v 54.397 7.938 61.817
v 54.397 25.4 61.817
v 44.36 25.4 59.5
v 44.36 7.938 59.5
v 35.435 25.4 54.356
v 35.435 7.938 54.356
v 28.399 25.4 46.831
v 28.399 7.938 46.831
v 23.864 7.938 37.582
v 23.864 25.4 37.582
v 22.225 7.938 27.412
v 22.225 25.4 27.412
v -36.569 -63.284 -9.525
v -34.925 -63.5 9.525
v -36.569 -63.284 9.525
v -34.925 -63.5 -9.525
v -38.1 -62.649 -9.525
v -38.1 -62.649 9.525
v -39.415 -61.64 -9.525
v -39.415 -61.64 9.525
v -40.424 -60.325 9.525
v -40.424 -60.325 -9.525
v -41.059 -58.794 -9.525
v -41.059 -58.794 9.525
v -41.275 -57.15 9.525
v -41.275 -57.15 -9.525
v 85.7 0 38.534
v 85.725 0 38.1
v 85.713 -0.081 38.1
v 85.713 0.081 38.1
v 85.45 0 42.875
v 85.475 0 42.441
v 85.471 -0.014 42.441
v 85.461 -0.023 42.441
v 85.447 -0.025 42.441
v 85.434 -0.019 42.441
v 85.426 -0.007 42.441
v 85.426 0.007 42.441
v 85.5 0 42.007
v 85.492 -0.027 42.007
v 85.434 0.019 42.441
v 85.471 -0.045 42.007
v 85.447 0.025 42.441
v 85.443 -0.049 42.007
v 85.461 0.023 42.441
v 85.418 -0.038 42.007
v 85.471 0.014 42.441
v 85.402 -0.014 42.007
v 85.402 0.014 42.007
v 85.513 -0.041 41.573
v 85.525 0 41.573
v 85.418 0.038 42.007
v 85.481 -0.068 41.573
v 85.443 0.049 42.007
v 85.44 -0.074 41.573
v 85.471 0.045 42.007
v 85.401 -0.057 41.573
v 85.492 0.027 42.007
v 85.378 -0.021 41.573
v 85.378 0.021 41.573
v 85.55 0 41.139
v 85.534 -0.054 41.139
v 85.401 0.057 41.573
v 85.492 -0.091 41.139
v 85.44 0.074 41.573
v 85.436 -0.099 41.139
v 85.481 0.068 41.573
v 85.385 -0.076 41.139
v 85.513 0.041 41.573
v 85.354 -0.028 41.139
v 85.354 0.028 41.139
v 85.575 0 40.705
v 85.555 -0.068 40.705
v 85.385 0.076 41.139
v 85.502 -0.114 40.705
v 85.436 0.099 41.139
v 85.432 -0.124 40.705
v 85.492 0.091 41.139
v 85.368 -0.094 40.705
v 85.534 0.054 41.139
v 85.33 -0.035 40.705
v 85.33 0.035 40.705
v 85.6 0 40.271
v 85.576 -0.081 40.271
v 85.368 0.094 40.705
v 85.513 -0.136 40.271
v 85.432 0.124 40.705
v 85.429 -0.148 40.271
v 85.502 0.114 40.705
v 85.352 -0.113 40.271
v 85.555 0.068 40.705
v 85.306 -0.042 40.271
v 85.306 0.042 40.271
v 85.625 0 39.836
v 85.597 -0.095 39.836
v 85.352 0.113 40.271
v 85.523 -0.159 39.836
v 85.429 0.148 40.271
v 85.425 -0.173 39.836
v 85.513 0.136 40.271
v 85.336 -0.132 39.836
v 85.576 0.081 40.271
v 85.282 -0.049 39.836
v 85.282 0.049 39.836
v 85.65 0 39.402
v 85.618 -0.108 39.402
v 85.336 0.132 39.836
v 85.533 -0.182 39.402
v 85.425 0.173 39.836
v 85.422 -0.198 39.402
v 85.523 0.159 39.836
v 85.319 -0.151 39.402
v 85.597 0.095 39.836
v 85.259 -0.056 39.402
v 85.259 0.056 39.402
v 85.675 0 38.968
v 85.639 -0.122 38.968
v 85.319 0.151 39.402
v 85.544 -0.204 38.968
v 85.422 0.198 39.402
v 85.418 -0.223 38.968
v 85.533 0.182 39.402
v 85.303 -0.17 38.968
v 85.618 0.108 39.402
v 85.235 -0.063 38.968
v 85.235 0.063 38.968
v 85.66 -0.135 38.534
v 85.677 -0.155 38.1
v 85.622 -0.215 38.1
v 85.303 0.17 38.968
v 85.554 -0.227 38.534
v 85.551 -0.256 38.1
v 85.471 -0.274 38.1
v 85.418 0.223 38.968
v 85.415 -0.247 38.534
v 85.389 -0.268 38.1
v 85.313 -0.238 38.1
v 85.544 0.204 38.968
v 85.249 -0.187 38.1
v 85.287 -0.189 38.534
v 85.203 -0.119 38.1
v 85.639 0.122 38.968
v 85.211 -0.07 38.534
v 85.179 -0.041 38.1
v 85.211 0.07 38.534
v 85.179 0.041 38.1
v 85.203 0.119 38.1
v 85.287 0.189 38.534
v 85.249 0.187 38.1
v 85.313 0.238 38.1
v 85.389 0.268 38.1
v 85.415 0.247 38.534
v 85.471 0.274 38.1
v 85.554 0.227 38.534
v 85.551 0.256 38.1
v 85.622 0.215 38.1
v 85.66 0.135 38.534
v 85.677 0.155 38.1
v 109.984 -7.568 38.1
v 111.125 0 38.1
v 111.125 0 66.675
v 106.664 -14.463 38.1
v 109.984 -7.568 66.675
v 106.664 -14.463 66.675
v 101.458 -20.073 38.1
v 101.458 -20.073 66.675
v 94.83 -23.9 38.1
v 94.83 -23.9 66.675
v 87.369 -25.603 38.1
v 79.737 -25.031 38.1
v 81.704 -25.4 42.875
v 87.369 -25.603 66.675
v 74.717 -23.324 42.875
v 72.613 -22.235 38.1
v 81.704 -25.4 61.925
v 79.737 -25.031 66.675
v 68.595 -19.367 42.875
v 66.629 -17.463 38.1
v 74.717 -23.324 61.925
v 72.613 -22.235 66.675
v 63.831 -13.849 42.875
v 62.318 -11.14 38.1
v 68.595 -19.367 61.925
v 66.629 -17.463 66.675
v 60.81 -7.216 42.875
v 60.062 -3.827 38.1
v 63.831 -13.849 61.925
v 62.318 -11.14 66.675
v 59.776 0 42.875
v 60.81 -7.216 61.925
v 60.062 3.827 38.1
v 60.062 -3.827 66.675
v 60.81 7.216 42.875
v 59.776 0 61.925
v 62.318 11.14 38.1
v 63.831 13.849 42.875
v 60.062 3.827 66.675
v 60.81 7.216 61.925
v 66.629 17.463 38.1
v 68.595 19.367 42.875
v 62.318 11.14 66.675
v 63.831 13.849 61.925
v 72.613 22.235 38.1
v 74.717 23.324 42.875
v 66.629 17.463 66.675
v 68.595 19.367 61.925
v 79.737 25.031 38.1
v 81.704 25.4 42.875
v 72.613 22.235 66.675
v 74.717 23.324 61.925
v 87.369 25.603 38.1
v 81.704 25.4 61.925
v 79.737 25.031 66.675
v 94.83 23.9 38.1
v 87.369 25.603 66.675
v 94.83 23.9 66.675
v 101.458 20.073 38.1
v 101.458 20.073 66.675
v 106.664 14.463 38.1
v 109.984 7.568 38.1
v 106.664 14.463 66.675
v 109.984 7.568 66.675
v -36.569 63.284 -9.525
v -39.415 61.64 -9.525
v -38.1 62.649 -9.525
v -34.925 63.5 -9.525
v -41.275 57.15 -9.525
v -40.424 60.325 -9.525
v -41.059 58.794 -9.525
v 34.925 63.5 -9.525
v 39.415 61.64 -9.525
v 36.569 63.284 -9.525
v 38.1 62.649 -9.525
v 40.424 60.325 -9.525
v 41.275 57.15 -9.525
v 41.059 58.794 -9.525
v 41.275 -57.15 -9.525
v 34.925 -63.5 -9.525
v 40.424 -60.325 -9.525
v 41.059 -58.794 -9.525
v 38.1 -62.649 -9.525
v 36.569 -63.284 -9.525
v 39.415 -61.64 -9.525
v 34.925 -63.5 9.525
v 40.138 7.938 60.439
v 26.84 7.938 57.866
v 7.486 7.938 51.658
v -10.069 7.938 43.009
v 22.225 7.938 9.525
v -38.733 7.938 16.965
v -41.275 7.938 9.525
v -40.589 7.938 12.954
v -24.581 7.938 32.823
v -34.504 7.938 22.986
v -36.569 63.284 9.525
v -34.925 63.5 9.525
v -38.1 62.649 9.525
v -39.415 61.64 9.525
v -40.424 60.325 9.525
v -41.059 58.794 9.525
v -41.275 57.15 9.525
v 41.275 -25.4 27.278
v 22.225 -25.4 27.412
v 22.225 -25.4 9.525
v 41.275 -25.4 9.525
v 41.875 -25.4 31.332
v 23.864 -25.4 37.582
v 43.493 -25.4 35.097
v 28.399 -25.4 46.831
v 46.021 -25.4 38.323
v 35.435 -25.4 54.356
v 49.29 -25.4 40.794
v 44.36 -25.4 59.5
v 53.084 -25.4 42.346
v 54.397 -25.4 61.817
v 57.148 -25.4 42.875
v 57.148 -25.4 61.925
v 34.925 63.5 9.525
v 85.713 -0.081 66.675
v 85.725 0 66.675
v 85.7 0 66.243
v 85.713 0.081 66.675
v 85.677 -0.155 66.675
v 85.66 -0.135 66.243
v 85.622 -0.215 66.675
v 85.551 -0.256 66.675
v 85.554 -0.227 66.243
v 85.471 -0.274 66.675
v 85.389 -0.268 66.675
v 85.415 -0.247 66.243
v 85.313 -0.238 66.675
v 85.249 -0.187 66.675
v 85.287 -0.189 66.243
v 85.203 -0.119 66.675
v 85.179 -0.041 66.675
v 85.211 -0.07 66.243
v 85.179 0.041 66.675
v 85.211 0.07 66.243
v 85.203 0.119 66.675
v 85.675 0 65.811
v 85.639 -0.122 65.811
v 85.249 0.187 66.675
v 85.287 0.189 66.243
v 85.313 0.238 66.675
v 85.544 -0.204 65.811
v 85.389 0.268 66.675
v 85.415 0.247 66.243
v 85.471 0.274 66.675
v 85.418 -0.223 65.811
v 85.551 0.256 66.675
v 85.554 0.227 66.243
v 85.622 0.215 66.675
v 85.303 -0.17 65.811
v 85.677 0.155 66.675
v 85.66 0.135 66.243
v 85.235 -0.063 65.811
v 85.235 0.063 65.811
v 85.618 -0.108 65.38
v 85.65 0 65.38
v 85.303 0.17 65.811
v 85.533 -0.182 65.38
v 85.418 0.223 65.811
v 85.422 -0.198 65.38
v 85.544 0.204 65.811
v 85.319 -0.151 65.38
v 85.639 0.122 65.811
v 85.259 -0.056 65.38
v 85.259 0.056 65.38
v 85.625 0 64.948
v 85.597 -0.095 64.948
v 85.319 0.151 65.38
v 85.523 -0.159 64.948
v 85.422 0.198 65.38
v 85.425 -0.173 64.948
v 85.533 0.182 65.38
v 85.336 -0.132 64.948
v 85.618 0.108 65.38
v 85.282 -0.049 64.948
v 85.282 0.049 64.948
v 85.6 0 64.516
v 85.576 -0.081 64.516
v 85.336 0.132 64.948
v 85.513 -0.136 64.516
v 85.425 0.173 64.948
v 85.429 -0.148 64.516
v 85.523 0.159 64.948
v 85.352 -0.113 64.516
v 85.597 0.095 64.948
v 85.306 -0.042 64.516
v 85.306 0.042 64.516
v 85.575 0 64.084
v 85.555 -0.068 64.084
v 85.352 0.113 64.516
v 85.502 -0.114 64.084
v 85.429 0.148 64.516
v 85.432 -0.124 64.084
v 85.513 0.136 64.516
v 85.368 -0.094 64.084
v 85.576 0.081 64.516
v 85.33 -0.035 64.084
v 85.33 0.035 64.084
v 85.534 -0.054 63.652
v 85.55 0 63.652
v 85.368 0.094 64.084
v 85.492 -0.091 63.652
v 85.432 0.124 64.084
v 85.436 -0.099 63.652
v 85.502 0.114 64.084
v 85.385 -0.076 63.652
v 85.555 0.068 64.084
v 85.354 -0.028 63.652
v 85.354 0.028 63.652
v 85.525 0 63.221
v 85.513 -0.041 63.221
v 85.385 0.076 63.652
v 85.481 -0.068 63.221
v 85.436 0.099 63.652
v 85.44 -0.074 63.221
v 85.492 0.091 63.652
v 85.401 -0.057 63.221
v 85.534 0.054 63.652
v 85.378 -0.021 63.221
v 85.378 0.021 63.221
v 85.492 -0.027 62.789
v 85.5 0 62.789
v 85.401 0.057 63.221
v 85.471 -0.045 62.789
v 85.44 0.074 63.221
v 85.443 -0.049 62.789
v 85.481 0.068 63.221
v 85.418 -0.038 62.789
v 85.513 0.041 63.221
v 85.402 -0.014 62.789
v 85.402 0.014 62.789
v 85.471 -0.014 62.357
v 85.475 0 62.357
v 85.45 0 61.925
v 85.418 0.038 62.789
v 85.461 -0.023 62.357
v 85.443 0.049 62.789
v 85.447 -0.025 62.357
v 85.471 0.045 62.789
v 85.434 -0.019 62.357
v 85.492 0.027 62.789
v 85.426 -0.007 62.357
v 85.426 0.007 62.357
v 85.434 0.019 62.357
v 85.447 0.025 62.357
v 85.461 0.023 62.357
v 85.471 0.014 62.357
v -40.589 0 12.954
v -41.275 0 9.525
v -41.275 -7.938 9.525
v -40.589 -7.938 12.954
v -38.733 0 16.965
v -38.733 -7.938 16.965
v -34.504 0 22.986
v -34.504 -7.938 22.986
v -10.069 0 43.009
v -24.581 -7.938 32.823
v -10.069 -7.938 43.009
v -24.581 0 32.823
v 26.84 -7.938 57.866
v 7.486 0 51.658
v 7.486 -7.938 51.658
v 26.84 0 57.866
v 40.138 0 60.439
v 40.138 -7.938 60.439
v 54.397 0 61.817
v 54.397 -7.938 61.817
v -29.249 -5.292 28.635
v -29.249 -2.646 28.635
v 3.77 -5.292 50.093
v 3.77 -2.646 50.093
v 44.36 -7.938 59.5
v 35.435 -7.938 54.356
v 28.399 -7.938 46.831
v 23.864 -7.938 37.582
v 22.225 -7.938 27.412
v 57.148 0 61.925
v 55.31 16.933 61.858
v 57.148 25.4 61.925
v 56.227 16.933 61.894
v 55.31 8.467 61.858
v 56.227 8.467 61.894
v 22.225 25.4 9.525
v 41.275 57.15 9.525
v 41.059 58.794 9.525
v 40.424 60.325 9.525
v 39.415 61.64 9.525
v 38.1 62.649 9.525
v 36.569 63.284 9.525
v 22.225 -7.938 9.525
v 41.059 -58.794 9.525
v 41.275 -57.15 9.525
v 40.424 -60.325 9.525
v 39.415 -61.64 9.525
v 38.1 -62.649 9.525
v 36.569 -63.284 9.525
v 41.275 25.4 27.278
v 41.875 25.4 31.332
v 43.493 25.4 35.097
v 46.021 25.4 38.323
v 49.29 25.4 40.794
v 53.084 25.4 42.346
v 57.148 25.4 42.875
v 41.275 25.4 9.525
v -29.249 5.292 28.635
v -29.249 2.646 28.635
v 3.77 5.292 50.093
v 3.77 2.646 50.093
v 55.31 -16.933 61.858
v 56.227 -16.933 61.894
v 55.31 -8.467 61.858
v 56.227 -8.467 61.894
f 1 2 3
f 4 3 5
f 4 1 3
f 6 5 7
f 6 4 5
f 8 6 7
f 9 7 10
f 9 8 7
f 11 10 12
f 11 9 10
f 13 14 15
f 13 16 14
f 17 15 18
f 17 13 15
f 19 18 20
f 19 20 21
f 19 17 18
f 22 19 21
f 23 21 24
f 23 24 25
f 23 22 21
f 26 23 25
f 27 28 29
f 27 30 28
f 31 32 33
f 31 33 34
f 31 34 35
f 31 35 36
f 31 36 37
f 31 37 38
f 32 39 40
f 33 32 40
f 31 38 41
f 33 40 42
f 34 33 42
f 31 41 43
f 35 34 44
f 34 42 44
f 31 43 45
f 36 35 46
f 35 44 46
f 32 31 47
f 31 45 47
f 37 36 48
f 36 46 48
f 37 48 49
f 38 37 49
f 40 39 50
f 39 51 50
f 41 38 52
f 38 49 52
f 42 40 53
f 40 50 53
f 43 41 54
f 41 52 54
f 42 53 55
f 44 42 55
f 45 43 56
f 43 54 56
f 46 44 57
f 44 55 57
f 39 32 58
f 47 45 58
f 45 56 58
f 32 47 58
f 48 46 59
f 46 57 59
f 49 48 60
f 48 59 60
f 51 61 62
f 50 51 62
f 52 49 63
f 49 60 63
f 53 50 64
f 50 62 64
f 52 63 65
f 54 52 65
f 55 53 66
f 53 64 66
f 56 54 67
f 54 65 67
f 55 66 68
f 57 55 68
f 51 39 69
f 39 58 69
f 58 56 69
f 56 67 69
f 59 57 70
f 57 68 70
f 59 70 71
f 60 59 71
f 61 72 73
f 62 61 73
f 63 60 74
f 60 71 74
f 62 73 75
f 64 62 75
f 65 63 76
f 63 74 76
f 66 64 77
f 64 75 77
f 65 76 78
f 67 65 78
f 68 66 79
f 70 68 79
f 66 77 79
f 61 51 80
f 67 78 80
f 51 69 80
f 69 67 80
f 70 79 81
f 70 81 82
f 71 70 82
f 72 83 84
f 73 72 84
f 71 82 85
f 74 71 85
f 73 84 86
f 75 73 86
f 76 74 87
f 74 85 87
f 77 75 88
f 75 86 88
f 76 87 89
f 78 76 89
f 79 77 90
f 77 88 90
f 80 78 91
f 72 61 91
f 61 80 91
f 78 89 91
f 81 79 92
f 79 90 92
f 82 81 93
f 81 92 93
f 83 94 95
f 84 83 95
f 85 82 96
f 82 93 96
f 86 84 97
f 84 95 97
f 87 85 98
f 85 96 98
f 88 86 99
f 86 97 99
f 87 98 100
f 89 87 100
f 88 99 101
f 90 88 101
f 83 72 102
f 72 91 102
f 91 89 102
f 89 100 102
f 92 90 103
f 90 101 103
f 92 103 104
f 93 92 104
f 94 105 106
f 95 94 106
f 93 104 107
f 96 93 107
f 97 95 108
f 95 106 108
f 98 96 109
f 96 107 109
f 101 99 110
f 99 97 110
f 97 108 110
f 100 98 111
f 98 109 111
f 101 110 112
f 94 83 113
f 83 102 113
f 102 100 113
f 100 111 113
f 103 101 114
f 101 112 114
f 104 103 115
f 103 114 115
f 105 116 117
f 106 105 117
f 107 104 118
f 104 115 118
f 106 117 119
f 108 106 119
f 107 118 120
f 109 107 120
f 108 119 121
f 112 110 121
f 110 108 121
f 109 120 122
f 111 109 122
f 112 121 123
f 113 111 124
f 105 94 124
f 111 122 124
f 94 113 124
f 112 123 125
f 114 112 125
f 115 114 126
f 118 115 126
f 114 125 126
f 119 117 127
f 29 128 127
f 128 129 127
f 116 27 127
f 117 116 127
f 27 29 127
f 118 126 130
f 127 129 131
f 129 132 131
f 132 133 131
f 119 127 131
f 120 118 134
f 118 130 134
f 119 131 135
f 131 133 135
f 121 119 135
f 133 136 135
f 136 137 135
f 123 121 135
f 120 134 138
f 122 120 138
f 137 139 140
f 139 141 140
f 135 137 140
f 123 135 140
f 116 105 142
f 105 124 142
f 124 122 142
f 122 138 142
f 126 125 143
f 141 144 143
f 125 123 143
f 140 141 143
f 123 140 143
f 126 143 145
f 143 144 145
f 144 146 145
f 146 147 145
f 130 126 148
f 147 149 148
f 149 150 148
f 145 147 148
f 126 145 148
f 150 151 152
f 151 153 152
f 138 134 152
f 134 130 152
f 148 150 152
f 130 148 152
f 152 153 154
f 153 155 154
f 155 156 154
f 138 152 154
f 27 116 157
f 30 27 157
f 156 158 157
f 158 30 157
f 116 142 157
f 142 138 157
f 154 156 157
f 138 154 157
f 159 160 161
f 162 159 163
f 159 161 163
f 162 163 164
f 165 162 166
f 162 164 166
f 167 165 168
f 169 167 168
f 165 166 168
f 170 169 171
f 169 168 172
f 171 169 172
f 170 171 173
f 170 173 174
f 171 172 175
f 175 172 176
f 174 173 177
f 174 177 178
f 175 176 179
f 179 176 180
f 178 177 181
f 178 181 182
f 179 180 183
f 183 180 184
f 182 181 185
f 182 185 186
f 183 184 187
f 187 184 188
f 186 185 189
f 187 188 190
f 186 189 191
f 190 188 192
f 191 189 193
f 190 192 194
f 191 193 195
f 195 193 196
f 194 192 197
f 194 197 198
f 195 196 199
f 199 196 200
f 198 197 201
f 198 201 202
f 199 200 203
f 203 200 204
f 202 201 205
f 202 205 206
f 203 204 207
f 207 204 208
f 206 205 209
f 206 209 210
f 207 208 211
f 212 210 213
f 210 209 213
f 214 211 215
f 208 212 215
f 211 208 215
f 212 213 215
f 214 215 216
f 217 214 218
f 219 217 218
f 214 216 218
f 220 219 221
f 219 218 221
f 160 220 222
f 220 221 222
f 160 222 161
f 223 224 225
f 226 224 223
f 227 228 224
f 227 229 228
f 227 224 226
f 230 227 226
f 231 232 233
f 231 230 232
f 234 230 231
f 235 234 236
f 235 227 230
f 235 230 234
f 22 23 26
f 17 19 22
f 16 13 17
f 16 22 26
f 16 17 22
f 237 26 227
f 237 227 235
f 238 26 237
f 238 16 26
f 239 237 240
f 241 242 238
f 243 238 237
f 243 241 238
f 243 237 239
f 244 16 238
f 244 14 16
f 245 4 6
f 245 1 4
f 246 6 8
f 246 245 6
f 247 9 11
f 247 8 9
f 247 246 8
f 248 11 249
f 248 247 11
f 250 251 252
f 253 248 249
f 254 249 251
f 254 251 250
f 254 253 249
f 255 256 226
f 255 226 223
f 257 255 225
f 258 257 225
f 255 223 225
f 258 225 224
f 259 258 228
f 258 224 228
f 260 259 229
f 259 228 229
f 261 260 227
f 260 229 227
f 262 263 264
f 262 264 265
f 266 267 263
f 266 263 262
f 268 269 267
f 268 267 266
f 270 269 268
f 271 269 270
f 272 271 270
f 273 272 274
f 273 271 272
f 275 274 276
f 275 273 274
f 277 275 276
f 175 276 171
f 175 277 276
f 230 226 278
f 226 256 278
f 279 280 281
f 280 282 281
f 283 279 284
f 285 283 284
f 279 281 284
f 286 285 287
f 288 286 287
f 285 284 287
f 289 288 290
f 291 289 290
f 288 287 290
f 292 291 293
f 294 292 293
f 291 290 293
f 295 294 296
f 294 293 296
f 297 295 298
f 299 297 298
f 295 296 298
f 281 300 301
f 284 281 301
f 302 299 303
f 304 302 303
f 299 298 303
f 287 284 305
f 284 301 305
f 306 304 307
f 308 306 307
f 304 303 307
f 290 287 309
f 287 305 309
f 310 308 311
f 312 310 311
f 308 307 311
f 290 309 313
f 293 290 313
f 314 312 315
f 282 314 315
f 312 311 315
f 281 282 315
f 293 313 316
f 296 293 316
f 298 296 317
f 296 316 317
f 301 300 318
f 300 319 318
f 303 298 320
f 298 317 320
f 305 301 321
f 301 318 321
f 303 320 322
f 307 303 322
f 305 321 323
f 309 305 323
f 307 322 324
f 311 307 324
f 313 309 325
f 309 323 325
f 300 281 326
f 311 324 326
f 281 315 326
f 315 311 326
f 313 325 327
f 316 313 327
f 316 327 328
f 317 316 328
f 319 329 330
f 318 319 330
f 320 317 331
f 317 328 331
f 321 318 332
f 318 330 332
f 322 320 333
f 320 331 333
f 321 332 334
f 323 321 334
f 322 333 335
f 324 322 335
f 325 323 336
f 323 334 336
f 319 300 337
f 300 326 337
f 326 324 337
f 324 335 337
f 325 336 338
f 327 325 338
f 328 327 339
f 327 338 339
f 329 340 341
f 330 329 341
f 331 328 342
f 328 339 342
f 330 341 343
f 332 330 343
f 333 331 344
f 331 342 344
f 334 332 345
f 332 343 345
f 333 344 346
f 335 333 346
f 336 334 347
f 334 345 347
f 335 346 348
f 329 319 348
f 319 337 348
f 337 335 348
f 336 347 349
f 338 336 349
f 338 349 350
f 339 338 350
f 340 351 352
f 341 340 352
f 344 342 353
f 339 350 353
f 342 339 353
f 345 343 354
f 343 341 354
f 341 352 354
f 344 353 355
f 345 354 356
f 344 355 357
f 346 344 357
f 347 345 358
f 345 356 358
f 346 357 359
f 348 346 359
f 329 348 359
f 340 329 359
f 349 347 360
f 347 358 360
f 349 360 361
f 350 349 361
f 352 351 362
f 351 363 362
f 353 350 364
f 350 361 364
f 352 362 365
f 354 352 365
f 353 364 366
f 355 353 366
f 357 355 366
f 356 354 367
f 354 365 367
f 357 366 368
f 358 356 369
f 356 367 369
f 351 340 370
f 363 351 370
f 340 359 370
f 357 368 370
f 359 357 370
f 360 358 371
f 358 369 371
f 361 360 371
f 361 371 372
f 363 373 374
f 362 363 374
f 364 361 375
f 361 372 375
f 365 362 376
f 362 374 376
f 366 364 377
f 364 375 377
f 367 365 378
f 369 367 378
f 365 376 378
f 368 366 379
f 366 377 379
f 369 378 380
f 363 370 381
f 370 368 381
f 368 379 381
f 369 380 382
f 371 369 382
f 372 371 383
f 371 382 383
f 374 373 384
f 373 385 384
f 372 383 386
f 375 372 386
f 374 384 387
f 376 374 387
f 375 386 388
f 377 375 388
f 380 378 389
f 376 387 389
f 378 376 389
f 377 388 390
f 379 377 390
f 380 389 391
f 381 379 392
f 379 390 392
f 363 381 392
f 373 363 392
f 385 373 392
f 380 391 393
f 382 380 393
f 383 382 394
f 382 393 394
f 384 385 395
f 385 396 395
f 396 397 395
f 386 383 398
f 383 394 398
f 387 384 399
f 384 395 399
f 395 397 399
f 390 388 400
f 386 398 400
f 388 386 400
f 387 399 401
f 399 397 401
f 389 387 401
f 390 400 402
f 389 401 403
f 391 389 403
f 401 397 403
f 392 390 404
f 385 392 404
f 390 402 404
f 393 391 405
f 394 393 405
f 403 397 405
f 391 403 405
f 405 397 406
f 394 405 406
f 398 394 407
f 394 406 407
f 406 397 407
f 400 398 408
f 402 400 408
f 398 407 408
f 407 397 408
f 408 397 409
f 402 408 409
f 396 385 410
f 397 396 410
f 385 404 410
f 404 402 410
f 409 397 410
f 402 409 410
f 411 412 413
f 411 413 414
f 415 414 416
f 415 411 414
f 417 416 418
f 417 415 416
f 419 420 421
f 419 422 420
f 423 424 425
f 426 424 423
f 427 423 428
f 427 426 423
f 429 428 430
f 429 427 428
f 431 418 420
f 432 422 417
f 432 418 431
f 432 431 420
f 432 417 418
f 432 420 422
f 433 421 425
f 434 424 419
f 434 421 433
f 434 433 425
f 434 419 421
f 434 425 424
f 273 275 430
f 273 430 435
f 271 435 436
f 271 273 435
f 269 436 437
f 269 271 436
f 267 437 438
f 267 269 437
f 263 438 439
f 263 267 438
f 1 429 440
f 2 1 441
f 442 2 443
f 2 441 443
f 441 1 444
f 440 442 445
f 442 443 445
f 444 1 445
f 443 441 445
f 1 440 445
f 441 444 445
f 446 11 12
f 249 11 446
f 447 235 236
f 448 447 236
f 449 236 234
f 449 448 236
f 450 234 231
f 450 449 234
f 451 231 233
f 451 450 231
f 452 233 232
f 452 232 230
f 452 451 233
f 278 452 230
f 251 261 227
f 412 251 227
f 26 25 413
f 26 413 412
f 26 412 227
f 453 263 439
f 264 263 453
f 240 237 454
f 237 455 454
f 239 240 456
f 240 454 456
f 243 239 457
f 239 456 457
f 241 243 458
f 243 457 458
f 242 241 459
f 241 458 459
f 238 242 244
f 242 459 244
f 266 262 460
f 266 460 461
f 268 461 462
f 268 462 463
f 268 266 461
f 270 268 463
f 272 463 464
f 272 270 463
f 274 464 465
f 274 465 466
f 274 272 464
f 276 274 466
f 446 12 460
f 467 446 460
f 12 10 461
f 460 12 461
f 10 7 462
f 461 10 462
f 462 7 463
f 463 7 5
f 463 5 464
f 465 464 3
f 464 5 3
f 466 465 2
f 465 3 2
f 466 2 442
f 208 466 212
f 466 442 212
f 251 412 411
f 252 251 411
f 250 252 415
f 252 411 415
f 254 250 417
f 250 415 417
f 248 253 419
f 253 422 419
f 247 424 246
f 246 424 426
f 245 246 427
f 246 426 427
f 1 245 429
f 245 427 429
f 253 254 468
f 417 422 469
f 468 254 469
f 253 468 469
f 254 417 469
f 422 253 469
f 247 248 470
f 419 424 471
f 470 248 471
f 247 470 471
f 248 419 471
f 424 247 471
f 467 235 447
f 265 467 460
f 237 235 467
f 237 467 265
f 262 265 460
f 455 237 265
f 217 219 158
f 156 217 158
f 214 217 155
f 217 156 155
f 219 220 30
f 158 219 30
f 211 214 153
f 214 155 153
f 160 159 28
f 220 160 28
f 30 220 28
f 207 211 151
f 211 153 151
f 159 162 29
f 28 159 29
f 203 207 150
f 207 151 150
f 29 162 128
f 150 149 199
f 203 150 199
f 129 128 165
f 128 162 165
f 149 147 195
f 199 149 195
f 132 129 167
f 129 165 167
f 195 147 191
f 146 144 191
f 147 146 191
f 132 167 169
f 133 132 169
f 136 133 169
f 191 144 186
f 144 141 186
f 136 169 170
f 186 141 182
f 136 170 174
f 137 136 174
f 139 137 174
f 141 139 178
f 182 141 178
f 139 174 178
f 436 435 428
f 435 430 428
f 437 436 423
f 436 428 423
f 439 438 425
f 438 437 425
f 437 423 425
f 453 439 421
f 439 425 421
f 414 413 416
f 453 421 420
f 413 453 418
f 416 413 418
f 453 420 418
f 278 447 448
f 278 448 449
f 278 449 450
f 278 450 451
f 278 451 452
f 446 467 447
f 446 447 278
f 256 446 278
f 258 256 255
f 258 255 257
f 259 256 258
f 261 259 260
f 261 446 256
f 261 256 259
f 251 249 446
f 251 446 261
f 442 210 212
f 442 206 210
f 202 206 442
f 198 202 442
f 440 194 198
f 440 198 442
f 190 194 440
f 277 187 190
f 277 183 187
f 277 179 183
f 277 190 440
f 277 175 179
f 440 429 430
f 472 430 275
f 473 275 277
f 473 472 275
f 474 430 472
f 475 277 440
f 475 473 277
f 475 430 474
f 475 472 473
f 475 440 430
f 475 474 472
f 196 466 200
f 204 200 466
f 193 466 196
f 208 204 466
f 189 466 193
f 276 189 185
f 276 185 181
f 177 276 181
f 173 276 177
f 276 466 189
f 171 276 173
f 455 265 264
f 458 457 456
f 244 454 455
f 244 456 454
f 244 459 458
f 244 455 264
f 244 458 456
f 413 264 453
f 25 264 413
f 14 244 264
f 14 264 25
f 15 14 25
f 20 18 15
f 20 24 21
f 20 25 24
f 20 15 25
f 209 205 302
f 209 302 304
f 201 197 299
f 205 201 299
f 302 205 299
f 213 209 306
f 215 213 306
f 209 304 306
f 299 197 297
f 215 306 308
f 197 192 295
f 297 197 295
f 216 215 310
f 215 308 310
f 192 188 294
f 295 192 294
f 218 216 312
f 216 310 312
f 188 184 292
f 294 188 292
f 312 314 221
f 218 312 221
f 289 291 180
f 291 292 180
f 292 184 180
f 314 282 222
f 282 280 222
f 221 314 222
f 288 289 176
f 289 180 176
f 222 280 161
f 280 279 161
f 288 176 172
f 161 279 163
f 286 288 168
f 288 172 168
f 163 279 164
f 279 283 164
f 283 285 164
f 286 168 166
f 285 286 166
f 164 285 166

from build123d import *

# Parameters (mm, degrees)
F1_DEPTH = 63.5
F2_DEPTH = 25.4
F3_DEPTH = 7.9375
F5_R     = 6.35


with BuildPart() as f1:
    # F0 (on Front) → F1 (new body, symmetric)
    with BuildSketch(Plane.XZ):
        Polygon((-41.275, -9.525), (41.275, -9.525), (41.275, 9.525), (22.225, 9.525), (-41.275, 9.525), align=None)
    extrude(amount=F1_DEPTH, both=True)

    # F0 (on Front) → F2 (join, symmetric)
    with BuildSketch(Plane.XZ):
        with BuildLine():
            Line((22.225, 9.525), (41.275, 9.525))
            Line((41.275, 9.525), (41.275, 27.277773))
            ThreePointArc((41.275, 27.277773), (46.020823, 38.323232), (57.147573, 42.8752))
            Line((57.147573, 42.8752), (60.325, 42.8752))
            Line((60.325, 42.8752), (60.325, 57.277))
            Line((60.325, 57.277), (60.325, 61.9252))
            Line((60.325, 61.9252), (57.147573, 61.9252))
            add(Edge.make_bspline(
                [(54.397042, 61.816722), (55.308689, 61.860952), (56.225552, 61.897181), (57.147573, 61.9252)],
                knots=[109.785705, 109.785705, 109.785705, 109.785705, 111.502394, 111.502394, 111.502394, 111.502394], degree=3))
            ThreePointArc((54.397042, 61.816722), (31.637999, 50.854282), (22.225, 27.411915))
            Line((22.225, 27.411915), (22.225, 9.525))
        make_face()
        Polygon((60.325, 57.277), (60.325, 42.8752), (85.450254, 42.8752), (85.450254, 61.9252), (60.325, 61.9252), align=None)
    extrude(amount=F2_DEPTH, both=True)

    # F0 (on Front) → F3 (join, symmetric)
    with BuildSketch(Plane.XZ):
        with BuildLine():
            add(Edge.make_bspline(
                [(-41.275, 9.525), (-40.874115, 23.43416), (-3.90464, 58.988111), (54.397042, 61.816722)],
                knots=[0, 0, 0, 0, 109.785705, 109.785705, 109.785705, 109.785705], degree=3))
            Line((-41.275, 9.525), (22.225, 9.525))
            Line((22.225, 9.525), (22.225, 27.411915))
            ThreePointArc((22.225, 27.411915), (31.637999, 50.854282), (54.397042, 61.816722))
        make_face()
    extrude(amount=F3_DEPTH, both=True)

    # F0 (on Front) → F4 (revolve)
    with BuildSketch(Plane.XZ):
        Polygon((85.450254, 61.9252), (85.450254, 42.8752), (85.725, 38.1), (111.125, 38.1), (111.125, 66.675), (85.725, 66.675), align=None)
    revolve(axis=Axis((85.450254, 0, 52.4002), (0, 0, -1)))

    # F5
    f5_edges = [f1.edges().sort_by_distance(p)[0] for p in [
        (41.275, -63.5, 0),
        (-41.275, -63.5, 0),
        (41.275, 63.5, 0),
        (-41.275, 63.5, 0),
    ]]
    fillet(f5_edges, radius=F5_R)


solid = f1.part
